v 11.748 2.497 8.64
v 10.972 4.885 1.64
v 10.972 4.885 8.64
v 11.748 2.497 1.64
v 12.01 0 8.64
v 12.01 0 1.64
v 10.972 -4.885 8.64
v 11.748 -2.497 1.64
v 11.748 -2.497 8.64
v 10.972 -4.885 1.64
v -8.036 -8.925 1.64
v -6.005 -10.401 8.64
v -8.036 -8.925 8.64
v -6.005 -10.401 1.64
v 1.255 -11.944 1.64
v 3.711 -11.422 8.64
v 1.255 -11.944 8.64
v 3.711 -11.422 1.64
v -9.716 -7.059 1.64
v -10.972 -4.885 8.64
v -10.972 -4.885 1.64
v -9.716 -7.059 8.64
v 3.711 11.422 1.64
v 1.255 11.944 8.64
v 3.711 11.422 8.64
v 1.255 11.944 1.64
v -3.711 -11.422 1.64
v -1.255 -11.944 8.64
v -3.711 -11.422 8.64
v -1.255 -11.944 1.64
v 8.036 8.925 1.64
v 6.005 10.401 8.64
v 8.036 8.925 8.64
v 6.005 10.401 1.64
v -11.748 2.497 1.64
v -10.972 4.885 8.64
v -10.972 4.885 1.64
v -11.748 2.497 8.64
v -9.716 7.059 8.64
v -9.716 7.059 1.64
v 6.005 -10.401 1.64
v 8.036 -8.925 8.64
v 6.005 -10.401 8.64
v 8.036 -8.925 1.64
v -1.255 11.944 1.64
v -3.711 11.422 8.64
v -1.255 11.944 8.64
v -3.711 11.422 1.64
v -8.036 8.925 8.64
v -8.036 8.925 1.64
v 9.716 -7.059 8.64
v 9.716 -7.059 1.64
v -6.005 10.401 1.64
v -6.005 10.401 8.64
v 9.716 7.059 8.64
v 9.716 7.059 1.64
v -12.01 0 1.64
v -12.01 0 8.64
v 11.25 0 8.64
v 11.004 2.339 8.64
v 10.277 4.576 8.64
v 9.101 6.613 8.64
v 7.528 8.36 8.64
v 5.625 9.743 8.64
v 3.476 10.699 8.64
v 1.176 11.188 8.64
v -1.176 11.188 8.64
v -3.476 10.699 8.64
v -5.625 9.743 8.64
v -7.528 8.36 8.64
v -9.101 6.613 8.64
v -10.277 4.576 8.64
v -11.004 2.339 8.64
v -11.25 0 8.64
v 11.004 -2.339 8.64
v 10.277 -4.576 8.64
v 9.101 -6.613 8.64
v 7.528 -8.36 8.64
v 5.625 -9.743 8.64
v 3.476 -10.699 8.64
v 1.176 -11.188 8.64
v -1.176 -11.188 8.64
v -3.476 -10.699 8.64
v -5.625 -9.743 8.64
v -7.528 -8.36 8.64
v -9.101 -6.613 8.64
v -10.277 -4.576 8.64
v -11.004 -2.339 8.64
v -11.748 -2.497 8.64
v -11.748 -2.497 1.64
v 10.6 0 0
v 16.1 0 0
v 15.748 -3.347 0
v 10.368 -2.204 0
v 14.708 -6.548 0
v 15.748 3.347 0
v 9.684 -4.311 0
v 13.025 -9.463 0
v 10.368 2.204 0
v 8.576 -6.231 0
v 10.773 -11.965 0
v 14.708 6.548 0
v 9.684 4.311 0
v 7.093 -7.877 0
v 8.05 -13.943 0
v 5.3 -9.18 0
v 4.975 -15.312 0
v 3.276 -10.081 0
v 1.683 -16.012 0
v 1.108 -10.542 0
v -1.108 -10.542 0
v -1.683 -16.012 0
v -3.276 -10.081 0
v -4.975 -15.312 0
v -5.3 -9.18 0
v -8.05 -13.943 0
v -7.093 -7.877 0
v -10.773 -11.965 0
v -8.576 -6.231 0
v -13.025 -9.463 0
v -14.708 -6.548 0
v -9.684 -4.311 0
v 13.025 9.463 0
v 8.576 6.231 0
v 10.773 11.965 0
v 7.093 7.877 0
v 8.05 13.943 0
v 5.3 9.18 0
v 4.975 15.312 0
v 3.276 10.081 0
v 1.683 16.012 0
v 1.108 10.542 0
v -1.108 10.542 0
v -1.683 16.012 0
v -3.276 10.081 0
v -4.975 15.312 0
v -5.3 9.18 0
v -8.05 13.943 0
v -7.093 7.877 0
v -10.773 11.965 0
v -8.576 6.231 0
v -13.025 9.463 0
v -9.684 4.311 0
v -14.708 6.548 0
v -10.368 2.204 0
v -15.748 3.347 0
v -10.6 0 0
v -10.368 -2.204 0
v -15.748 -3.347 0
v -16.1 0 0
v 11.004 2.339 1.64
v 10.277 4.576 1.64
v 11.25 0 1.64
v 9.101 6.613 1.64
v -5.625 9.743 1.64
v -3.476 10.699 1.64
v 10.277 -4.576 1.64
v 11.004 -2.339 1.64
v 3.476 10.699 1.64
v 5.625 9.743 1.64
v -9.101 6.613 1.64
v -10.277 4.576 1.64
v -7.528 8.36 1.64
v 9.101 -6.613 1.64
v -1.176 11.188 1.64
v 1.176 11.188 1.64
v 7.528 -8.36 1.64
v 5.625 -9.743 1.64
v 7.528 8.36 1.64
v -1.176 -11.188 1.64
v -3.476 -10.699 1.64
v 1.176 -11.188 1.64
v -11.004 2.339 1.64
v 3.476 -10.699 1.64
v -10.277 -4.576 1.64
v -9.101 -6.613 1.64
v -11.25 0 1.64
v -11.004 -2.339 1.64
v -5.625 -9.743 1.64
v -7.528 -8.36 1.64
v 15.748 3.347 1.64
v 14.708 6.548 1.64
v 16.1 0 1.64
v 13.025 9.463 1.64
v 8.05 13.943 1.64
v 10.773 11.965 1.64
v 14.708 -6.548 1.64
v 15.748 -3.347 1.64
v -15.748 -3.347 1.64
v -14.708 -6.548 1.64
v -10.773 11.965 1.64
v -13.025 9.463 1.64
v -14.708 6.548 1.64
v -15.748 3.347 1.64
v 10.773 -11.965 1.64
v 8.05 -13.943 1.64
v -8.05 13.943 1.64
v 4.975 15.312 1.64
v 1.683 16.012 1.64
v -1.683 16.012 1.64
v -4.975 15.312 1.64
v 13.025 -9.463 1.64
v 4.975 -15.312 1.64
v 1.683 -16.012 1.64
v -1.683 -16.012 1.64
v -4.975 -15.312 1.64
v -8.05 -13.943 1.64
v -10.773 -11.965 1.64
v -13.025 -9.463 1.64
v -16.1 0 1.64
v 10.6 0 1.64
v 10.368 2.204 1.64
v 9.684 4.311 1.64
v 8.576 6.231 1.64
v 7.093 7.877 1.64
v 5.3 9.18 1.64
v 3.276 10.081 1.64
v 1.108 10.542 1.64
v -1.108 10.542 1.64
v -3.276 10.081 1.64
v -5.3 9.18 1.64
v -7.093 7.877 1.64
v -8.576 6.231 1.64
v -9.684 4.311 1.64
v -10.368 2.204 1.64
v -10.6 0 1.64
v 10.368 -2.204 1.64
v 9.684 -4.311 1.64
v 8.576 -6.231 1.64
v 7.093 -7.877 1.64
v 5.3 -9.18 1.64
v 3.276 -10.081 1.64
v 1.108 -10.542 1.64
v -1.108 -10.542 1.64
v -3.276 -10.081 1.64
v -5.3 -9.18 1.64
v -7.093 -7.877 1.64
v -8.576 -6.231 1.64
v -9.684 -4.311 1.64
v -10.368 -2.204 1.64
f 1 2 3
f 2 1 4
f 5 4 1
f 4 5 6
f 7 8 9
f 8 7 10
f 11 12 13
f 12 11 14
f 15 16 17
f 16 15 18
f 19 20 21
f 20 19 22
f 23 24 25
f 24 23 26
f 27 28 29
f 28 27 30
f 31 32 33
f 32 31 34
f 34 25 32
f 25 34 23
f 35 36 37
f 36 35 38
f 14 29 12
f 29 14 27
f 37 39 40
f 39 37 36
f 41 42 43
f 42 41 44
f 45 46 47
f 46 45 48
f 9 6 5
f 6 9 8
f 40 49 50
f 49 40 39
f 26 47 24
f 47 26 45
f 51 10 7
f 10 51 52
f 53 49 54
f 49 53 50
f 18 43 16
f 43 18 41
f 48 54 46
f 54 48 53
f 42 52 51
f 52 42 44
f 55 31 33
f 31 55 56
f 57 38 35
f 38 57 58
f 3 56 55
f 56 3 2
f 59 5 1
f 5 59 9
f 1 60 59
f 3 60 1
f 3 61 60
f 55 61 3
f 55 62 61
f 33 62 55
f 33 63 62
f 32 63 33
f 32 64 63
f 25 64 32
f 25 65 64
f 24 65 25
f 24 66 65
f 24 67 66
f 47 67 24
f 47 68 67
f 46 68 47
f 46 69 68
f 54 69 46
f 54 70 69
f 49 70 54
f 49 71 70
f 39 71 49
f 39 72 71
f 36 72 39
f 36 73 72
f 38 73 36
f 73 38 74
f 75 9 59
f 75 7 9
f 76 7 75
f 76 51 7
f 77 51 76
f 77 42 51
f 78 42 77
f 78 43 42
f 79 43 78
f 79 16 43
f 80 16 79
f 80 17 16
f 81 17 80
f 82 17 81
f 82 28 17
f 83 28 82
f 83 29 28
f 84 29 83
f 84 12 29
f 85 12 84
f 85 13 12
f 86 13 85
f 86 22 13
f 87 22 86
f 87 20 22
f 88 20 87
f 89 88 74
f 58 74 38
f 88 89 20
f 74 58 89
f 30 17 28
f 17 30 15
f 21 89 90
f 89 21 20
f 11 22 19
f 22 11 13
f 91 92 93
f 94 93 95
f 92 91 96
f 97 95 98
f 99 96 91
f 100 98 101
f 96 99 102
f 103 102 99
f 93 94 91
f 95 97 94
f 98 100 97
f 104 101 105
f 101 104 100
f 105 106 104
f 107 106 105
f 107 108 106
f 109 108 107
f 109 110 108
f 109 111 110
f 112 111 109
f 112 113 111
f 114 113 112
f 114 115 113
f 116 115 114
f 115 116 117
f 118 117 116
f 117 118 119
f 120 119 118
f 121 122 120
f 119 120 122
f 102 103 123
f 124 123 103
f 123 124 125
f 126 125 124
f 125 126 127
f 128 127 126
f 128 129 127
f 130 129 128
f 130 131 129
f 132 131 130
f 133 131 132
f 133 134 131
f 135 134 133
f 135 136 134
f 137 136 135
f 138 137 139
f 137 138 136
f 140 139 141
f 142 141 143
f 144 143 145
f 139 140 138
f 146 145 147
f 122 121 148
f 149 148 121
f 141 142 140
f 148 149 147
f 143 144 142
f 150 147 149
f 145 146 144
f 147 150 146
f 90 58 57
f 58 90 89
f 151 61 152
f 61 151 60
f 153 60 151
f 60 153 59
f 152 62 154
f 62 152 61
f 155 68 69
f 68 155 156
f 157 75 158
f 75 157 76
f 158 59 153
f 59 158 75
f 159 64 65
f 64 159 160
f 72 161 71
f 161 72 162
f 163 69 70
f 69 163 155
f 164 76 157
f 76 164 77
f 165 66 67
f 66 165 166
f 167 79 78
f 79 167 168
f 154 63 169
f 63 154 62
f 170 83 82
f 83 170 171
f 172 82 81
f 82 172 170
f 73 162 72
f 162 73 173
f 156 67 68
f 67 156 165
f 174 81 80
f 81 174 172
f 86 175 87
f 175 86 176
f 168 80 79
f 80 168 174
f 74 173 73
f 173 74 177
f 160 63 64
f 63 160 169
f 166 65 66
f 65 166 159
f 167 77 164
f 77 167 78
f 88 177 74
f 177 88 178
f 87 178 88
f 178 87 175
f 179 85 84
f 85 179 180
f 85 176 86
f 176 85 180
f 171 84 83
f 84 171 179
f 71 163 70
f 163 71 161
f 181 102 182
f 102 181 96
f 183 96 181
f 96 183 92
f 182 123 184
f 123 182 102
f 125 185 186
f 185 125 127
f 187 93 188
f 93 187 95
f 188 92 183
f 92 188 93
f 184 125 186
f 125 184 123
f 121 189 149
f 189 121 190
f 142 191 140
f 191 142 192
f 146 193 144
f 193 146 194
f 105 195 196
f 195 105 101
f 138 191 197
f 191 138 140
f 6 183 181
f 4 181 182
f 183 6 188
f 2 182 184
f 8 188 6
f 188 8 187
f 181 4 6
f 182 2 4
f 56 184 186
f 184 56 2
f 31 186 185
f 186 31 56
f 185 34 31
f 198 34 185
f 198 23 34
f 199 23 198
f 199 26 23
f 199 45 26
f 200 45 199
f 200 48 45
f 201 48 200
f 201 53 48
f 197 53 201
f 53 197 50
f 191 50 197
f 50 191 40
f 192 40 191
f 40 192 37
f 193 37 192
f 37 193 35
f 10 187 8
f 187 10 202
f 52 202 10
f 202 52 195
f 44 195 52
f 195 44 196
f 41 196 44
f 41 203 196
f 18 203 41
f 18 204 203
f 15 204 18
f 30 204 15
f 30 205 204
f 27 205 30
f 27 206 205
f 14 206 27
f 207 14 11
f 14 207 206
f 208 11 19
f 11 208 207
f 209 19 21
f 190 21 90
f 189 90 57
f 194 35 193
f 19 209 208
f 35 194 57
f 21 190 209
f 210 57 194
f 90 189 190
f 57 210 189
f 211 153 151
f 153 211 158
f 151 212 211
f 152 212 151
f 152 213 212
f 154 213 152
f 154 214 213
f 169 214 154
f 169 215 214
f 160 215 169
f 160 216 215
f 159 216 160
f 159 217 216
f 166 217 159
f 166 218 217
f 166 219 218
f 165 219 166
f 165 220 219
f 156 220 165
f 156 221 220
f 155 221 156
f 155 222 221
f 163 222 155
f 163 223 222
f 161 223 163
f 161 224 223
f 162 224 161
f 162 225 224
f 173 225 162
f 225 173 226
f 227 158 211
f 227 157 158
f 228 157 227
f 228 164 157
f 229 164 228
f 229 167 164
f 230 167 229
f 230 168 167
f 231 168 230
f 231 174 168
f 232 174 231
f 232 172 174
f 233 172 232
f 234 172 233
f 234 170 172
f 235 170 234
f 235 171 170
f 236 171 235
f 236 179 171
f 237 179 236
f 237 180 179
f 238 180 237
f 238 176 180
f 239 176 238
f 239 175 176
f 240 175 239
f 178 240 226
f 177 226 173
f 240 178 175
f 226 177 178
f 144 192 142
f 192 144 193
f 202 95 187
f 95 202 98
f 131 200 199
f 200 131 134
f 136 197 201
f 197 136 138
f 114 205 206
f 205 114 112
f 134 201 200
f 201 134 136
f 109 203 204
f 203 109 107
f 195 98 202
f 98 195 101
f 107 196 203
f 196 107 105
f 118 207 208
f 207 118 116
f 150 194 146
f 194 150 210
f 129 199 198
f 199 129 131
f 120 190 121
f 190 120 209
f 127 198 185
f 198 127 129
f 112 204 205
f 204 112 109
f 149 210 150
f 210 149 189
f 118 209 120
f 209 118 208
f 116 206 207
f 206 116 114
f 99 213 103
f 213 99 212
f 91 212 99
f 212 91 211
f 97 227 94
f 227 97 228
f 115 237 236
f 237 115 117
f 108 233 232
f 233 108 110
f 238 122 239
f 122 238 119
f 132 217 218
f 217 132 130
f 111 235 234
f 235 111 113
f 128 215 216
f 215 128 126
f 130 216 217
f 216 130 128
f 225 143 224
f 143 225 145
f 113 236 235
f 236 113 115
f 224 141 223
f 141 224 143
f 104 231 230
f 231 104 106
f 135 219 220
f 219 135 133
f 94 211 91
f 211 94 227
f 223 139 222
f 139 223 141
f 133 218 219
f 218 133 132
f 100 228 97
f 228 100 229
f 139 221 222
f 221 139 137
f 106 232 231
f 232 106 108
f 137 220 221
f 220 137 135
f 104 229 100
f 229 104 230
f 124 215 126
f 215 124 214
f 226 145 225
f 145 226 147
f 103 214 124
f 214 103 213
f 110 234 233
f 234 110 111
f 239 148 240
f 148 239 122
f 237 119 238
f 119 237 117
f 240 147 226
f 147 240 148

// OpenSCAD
//PRUSAMendel
//GNUGPLv2
//GregFrost

/**
*@categoryPrinted
*/

layer_height=0.4;
perimeter_w_over_t=1.9;

single_layer_width=layer_height*perimeter_w_over_t;
bearing_inner=22.2;
thickness=layer_height*4.1;
height=7+thickness;
wall_ascent=5;
wall_descent=0.5;
tolerance=0.15;

module inner()
{
	difference()
	{
		cylinder(r=bearing_inner/2+single_layer_width+tolerance,h=height);
		translate([0,0,-1])
		cylinder(r=bearing_inner/2+tolerance,h=height+2);
	}

	difference()
	{
		cylinder(r=bearing_inner/2+wall_ascent,h=thickness);
		translate([0,0,-1])
		cylinder(r=bearing_inner/2-wall_descent,h=thickness+2);
	}
}

module outer()
{
	difference()
	{
		cylinder(r=bearing_inner/2+2*single_layer_width+2*tolerance,h=height);
		translate([0,0,-1])
		cylinder(r=bearing_inner/2+single_layer_width+2*tolerance,h=height+2);
	}

	difference()
	{
		cylinder(r=bearing_inner/2+wall_ascent,h=thickness);
		translate([0,0,-1])
		cylinder(r=bearing_inner/2-wall_descent,h=thickness+2);
	}
}

inner();

//translate([34,0,0])
//outer();
